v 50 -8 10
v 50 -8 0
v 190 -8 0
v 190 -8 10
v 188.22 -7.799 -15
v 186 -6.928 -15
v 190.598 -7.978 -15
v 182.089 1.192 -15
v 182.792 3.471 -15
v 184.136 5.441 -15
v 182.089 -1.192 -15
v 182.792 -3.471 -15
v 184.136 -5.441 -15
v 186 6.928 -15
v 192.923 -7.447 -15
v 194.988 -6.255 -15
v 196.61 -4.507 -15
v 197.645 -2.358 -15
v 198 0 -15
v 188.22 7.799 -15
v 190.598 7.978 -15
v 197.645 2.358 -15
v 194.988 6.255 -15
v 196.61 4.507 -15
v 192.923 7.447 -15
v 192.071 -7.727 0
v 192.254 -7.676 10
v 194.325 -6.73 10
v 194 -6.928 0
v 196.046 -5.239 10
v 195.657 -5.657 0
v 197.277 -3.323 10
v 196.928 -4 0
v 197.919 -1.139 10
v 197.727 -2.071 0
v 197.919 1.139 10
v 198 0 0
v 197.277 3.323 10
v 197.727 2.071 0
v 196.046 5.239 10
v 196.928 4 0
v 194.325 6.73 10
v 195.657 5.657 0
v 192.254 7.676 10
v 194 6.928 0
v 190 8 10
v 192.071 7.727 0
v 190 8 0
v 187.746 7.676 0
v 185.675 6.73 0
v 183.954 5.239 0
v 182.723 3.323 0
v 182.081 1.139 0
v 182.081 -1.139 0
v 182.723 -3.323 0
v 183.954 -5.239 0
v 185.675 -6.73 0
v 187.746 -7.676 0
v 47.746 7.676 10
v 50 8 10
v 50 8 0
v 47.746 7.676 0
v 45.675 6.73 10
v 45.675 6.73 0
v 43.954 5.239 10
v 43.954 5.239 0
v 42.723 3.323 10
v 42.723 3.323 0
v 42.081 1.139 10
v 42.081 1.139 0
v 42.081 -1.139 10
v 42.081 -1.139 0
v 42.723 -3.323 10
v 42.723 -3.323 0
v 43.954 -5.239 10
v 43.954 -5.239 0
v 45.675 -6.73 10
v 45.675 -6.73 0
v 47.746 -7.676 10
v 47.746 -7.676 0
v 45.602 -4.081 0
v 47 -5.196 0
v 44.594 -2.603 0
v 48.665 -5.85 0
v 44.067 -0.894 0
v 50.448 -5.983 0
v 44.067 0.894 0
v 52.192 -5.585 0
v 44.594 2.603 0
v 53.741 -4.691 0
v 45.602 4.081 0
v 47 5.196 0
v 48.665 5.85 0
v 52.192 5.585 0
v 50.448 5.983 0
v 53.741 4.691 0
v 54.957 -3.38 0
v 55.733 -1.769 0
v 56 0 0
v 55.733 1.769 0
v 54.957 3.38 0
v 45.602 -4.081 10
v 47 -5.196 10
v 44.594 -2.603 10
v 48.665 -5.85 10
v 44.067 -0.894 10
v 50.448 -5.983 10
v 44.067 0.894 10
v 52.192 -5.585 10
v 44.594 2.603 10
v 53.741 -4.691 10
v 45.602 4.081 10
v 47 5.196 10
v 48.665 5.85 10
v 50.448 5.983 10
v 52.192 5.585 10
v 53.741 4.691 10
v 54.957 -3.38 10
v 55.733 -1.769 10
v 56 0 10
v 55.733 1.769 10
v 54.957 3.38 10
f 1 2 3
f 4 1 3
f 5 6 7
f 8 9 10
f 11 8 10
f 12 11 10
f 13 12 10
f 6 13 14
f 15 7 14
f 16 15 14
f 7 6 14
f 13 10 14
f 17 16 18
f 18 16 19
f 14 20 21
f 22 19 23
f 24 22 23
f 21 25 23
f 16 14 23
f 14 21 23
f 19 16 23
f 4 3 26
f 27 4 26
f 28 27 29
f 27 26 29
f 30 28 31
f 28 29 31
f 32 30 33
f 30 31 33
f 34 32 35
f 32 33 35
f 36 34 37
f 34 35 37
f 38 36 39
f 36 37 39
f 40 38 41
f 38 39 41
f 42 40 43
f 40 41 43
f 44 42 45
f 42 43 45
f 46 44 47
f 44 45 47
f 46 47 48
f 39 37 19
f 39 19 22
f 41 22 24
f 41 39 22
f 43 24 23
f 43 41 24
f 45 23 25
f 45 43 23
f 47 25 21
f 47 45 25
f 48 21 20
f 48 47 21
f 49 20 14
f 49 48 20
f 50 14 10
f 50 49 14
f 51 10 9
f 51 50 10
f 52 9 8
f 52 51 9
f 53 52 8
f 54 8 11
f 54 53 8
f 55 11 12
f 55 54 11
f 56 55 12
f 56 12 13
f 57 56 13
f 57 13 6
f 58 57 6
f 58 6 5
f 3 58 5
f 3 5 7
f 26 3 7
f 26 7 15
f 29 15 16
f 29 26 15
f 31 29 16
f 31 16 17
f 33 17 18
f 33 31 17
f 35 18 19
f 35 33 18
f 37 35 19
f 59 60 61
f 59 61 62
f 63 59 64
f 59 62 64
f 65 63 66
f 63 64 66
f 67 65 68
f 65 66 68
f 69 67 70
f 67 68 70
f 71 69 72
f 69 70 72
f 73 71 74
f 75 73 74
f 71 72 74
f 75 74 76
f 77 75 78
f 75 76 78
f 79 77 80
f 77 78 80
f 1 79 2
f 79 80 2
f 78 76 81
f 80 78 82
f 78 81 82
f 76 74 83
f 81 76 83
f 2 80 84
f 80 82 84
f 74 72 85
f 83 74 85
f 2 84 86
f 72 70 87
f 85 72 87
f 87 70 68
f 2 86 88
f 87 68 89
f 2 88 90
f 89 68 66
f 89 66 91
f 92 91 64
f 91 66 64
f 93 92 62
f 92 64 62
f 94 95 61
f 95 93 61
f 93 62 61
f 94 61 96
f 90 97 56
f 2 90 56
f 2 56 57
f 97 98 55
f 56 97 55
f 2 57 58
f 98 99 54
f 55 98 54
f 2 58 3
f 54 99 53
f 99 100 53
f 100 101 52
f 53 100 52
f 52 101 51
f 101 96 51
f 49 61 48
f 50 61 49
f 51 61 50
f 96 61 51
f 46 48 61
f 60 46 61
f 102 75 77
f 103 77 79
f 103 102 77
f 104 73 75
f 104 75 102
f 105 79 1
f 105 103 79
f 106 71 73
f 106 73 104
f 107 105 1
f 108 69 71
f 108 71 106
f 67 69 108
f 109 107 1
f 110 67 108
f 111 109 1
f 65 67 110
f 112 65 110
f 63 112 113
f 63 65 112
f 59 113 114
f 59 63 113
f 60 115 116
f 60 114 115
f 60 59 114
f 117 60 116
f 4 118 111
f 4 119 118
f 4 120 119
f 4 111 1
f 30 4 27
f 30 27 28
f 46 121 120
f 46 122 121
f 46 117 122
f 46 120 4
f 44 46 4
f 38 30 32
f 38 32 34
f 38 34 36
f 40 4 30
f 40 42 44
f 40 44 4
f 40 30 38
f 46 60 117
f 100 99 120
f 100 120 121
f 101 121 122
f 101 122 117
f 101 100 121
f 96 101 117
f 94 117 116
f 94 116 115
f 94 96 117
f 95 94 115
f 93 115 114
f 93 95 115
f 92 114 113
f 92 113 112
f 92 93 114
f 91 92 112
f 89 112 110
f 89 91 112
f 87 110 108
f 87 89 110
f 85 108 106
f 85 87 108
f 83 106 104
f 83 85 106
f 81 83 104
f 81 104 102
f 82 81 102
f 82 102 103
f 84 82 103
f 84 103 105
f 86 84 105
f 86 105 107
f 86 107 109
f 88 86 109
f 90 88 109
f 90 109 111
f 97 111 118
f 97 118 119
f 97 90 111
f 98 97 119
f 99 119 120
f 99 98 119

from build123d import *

# Parameters (mm, degrees)
SKETCH1_R           = 6
BOSS_EXTRUDE1_DEPTH = 10
BOSS_EXTRUDE2_START = -15
BOSS_EXTRUDE2_DEPTH = 15


with BuildPart() as part:
    # Sketch1 → Boss-Extrude1 (new body)
    with BuildSketch(Plane.XY):
        with BuildLine():
            Line((190, 8), (50, 8))
            ThreePointArc((50, 8), (42, 0), (50, -8))
            Line((50, -8), (190, -8))
            ThreePointArc((190, -8), (198, 0), (190, 8))
        make_face()
        with Locations((50, 0)):
            Circle(SKETCH1_R, mode=Mode.SUBTRACT)
    extrude(amount=BOSS_EXTRUDE1_DEPTH)

    # Sketch1<6> → Boss-Extrude2 (add)
    with BuildSketch(Plane.XY.offset(BOSS_EXTRUDE2_START)):
        with BuildLine():
            ThreePointArc((198, 0), (195.656854249, 5.656854249), (190, 8))
            ThreePointArc((190, 8), (182, 0), (190, -8))
            ThreePointArc((190, -8), (195.656854249, -5.656854249), (198, 0))
        make_face()
    extrude(amount=BOSS_EXTRUDE2_DEPTH)


solid = part.part
